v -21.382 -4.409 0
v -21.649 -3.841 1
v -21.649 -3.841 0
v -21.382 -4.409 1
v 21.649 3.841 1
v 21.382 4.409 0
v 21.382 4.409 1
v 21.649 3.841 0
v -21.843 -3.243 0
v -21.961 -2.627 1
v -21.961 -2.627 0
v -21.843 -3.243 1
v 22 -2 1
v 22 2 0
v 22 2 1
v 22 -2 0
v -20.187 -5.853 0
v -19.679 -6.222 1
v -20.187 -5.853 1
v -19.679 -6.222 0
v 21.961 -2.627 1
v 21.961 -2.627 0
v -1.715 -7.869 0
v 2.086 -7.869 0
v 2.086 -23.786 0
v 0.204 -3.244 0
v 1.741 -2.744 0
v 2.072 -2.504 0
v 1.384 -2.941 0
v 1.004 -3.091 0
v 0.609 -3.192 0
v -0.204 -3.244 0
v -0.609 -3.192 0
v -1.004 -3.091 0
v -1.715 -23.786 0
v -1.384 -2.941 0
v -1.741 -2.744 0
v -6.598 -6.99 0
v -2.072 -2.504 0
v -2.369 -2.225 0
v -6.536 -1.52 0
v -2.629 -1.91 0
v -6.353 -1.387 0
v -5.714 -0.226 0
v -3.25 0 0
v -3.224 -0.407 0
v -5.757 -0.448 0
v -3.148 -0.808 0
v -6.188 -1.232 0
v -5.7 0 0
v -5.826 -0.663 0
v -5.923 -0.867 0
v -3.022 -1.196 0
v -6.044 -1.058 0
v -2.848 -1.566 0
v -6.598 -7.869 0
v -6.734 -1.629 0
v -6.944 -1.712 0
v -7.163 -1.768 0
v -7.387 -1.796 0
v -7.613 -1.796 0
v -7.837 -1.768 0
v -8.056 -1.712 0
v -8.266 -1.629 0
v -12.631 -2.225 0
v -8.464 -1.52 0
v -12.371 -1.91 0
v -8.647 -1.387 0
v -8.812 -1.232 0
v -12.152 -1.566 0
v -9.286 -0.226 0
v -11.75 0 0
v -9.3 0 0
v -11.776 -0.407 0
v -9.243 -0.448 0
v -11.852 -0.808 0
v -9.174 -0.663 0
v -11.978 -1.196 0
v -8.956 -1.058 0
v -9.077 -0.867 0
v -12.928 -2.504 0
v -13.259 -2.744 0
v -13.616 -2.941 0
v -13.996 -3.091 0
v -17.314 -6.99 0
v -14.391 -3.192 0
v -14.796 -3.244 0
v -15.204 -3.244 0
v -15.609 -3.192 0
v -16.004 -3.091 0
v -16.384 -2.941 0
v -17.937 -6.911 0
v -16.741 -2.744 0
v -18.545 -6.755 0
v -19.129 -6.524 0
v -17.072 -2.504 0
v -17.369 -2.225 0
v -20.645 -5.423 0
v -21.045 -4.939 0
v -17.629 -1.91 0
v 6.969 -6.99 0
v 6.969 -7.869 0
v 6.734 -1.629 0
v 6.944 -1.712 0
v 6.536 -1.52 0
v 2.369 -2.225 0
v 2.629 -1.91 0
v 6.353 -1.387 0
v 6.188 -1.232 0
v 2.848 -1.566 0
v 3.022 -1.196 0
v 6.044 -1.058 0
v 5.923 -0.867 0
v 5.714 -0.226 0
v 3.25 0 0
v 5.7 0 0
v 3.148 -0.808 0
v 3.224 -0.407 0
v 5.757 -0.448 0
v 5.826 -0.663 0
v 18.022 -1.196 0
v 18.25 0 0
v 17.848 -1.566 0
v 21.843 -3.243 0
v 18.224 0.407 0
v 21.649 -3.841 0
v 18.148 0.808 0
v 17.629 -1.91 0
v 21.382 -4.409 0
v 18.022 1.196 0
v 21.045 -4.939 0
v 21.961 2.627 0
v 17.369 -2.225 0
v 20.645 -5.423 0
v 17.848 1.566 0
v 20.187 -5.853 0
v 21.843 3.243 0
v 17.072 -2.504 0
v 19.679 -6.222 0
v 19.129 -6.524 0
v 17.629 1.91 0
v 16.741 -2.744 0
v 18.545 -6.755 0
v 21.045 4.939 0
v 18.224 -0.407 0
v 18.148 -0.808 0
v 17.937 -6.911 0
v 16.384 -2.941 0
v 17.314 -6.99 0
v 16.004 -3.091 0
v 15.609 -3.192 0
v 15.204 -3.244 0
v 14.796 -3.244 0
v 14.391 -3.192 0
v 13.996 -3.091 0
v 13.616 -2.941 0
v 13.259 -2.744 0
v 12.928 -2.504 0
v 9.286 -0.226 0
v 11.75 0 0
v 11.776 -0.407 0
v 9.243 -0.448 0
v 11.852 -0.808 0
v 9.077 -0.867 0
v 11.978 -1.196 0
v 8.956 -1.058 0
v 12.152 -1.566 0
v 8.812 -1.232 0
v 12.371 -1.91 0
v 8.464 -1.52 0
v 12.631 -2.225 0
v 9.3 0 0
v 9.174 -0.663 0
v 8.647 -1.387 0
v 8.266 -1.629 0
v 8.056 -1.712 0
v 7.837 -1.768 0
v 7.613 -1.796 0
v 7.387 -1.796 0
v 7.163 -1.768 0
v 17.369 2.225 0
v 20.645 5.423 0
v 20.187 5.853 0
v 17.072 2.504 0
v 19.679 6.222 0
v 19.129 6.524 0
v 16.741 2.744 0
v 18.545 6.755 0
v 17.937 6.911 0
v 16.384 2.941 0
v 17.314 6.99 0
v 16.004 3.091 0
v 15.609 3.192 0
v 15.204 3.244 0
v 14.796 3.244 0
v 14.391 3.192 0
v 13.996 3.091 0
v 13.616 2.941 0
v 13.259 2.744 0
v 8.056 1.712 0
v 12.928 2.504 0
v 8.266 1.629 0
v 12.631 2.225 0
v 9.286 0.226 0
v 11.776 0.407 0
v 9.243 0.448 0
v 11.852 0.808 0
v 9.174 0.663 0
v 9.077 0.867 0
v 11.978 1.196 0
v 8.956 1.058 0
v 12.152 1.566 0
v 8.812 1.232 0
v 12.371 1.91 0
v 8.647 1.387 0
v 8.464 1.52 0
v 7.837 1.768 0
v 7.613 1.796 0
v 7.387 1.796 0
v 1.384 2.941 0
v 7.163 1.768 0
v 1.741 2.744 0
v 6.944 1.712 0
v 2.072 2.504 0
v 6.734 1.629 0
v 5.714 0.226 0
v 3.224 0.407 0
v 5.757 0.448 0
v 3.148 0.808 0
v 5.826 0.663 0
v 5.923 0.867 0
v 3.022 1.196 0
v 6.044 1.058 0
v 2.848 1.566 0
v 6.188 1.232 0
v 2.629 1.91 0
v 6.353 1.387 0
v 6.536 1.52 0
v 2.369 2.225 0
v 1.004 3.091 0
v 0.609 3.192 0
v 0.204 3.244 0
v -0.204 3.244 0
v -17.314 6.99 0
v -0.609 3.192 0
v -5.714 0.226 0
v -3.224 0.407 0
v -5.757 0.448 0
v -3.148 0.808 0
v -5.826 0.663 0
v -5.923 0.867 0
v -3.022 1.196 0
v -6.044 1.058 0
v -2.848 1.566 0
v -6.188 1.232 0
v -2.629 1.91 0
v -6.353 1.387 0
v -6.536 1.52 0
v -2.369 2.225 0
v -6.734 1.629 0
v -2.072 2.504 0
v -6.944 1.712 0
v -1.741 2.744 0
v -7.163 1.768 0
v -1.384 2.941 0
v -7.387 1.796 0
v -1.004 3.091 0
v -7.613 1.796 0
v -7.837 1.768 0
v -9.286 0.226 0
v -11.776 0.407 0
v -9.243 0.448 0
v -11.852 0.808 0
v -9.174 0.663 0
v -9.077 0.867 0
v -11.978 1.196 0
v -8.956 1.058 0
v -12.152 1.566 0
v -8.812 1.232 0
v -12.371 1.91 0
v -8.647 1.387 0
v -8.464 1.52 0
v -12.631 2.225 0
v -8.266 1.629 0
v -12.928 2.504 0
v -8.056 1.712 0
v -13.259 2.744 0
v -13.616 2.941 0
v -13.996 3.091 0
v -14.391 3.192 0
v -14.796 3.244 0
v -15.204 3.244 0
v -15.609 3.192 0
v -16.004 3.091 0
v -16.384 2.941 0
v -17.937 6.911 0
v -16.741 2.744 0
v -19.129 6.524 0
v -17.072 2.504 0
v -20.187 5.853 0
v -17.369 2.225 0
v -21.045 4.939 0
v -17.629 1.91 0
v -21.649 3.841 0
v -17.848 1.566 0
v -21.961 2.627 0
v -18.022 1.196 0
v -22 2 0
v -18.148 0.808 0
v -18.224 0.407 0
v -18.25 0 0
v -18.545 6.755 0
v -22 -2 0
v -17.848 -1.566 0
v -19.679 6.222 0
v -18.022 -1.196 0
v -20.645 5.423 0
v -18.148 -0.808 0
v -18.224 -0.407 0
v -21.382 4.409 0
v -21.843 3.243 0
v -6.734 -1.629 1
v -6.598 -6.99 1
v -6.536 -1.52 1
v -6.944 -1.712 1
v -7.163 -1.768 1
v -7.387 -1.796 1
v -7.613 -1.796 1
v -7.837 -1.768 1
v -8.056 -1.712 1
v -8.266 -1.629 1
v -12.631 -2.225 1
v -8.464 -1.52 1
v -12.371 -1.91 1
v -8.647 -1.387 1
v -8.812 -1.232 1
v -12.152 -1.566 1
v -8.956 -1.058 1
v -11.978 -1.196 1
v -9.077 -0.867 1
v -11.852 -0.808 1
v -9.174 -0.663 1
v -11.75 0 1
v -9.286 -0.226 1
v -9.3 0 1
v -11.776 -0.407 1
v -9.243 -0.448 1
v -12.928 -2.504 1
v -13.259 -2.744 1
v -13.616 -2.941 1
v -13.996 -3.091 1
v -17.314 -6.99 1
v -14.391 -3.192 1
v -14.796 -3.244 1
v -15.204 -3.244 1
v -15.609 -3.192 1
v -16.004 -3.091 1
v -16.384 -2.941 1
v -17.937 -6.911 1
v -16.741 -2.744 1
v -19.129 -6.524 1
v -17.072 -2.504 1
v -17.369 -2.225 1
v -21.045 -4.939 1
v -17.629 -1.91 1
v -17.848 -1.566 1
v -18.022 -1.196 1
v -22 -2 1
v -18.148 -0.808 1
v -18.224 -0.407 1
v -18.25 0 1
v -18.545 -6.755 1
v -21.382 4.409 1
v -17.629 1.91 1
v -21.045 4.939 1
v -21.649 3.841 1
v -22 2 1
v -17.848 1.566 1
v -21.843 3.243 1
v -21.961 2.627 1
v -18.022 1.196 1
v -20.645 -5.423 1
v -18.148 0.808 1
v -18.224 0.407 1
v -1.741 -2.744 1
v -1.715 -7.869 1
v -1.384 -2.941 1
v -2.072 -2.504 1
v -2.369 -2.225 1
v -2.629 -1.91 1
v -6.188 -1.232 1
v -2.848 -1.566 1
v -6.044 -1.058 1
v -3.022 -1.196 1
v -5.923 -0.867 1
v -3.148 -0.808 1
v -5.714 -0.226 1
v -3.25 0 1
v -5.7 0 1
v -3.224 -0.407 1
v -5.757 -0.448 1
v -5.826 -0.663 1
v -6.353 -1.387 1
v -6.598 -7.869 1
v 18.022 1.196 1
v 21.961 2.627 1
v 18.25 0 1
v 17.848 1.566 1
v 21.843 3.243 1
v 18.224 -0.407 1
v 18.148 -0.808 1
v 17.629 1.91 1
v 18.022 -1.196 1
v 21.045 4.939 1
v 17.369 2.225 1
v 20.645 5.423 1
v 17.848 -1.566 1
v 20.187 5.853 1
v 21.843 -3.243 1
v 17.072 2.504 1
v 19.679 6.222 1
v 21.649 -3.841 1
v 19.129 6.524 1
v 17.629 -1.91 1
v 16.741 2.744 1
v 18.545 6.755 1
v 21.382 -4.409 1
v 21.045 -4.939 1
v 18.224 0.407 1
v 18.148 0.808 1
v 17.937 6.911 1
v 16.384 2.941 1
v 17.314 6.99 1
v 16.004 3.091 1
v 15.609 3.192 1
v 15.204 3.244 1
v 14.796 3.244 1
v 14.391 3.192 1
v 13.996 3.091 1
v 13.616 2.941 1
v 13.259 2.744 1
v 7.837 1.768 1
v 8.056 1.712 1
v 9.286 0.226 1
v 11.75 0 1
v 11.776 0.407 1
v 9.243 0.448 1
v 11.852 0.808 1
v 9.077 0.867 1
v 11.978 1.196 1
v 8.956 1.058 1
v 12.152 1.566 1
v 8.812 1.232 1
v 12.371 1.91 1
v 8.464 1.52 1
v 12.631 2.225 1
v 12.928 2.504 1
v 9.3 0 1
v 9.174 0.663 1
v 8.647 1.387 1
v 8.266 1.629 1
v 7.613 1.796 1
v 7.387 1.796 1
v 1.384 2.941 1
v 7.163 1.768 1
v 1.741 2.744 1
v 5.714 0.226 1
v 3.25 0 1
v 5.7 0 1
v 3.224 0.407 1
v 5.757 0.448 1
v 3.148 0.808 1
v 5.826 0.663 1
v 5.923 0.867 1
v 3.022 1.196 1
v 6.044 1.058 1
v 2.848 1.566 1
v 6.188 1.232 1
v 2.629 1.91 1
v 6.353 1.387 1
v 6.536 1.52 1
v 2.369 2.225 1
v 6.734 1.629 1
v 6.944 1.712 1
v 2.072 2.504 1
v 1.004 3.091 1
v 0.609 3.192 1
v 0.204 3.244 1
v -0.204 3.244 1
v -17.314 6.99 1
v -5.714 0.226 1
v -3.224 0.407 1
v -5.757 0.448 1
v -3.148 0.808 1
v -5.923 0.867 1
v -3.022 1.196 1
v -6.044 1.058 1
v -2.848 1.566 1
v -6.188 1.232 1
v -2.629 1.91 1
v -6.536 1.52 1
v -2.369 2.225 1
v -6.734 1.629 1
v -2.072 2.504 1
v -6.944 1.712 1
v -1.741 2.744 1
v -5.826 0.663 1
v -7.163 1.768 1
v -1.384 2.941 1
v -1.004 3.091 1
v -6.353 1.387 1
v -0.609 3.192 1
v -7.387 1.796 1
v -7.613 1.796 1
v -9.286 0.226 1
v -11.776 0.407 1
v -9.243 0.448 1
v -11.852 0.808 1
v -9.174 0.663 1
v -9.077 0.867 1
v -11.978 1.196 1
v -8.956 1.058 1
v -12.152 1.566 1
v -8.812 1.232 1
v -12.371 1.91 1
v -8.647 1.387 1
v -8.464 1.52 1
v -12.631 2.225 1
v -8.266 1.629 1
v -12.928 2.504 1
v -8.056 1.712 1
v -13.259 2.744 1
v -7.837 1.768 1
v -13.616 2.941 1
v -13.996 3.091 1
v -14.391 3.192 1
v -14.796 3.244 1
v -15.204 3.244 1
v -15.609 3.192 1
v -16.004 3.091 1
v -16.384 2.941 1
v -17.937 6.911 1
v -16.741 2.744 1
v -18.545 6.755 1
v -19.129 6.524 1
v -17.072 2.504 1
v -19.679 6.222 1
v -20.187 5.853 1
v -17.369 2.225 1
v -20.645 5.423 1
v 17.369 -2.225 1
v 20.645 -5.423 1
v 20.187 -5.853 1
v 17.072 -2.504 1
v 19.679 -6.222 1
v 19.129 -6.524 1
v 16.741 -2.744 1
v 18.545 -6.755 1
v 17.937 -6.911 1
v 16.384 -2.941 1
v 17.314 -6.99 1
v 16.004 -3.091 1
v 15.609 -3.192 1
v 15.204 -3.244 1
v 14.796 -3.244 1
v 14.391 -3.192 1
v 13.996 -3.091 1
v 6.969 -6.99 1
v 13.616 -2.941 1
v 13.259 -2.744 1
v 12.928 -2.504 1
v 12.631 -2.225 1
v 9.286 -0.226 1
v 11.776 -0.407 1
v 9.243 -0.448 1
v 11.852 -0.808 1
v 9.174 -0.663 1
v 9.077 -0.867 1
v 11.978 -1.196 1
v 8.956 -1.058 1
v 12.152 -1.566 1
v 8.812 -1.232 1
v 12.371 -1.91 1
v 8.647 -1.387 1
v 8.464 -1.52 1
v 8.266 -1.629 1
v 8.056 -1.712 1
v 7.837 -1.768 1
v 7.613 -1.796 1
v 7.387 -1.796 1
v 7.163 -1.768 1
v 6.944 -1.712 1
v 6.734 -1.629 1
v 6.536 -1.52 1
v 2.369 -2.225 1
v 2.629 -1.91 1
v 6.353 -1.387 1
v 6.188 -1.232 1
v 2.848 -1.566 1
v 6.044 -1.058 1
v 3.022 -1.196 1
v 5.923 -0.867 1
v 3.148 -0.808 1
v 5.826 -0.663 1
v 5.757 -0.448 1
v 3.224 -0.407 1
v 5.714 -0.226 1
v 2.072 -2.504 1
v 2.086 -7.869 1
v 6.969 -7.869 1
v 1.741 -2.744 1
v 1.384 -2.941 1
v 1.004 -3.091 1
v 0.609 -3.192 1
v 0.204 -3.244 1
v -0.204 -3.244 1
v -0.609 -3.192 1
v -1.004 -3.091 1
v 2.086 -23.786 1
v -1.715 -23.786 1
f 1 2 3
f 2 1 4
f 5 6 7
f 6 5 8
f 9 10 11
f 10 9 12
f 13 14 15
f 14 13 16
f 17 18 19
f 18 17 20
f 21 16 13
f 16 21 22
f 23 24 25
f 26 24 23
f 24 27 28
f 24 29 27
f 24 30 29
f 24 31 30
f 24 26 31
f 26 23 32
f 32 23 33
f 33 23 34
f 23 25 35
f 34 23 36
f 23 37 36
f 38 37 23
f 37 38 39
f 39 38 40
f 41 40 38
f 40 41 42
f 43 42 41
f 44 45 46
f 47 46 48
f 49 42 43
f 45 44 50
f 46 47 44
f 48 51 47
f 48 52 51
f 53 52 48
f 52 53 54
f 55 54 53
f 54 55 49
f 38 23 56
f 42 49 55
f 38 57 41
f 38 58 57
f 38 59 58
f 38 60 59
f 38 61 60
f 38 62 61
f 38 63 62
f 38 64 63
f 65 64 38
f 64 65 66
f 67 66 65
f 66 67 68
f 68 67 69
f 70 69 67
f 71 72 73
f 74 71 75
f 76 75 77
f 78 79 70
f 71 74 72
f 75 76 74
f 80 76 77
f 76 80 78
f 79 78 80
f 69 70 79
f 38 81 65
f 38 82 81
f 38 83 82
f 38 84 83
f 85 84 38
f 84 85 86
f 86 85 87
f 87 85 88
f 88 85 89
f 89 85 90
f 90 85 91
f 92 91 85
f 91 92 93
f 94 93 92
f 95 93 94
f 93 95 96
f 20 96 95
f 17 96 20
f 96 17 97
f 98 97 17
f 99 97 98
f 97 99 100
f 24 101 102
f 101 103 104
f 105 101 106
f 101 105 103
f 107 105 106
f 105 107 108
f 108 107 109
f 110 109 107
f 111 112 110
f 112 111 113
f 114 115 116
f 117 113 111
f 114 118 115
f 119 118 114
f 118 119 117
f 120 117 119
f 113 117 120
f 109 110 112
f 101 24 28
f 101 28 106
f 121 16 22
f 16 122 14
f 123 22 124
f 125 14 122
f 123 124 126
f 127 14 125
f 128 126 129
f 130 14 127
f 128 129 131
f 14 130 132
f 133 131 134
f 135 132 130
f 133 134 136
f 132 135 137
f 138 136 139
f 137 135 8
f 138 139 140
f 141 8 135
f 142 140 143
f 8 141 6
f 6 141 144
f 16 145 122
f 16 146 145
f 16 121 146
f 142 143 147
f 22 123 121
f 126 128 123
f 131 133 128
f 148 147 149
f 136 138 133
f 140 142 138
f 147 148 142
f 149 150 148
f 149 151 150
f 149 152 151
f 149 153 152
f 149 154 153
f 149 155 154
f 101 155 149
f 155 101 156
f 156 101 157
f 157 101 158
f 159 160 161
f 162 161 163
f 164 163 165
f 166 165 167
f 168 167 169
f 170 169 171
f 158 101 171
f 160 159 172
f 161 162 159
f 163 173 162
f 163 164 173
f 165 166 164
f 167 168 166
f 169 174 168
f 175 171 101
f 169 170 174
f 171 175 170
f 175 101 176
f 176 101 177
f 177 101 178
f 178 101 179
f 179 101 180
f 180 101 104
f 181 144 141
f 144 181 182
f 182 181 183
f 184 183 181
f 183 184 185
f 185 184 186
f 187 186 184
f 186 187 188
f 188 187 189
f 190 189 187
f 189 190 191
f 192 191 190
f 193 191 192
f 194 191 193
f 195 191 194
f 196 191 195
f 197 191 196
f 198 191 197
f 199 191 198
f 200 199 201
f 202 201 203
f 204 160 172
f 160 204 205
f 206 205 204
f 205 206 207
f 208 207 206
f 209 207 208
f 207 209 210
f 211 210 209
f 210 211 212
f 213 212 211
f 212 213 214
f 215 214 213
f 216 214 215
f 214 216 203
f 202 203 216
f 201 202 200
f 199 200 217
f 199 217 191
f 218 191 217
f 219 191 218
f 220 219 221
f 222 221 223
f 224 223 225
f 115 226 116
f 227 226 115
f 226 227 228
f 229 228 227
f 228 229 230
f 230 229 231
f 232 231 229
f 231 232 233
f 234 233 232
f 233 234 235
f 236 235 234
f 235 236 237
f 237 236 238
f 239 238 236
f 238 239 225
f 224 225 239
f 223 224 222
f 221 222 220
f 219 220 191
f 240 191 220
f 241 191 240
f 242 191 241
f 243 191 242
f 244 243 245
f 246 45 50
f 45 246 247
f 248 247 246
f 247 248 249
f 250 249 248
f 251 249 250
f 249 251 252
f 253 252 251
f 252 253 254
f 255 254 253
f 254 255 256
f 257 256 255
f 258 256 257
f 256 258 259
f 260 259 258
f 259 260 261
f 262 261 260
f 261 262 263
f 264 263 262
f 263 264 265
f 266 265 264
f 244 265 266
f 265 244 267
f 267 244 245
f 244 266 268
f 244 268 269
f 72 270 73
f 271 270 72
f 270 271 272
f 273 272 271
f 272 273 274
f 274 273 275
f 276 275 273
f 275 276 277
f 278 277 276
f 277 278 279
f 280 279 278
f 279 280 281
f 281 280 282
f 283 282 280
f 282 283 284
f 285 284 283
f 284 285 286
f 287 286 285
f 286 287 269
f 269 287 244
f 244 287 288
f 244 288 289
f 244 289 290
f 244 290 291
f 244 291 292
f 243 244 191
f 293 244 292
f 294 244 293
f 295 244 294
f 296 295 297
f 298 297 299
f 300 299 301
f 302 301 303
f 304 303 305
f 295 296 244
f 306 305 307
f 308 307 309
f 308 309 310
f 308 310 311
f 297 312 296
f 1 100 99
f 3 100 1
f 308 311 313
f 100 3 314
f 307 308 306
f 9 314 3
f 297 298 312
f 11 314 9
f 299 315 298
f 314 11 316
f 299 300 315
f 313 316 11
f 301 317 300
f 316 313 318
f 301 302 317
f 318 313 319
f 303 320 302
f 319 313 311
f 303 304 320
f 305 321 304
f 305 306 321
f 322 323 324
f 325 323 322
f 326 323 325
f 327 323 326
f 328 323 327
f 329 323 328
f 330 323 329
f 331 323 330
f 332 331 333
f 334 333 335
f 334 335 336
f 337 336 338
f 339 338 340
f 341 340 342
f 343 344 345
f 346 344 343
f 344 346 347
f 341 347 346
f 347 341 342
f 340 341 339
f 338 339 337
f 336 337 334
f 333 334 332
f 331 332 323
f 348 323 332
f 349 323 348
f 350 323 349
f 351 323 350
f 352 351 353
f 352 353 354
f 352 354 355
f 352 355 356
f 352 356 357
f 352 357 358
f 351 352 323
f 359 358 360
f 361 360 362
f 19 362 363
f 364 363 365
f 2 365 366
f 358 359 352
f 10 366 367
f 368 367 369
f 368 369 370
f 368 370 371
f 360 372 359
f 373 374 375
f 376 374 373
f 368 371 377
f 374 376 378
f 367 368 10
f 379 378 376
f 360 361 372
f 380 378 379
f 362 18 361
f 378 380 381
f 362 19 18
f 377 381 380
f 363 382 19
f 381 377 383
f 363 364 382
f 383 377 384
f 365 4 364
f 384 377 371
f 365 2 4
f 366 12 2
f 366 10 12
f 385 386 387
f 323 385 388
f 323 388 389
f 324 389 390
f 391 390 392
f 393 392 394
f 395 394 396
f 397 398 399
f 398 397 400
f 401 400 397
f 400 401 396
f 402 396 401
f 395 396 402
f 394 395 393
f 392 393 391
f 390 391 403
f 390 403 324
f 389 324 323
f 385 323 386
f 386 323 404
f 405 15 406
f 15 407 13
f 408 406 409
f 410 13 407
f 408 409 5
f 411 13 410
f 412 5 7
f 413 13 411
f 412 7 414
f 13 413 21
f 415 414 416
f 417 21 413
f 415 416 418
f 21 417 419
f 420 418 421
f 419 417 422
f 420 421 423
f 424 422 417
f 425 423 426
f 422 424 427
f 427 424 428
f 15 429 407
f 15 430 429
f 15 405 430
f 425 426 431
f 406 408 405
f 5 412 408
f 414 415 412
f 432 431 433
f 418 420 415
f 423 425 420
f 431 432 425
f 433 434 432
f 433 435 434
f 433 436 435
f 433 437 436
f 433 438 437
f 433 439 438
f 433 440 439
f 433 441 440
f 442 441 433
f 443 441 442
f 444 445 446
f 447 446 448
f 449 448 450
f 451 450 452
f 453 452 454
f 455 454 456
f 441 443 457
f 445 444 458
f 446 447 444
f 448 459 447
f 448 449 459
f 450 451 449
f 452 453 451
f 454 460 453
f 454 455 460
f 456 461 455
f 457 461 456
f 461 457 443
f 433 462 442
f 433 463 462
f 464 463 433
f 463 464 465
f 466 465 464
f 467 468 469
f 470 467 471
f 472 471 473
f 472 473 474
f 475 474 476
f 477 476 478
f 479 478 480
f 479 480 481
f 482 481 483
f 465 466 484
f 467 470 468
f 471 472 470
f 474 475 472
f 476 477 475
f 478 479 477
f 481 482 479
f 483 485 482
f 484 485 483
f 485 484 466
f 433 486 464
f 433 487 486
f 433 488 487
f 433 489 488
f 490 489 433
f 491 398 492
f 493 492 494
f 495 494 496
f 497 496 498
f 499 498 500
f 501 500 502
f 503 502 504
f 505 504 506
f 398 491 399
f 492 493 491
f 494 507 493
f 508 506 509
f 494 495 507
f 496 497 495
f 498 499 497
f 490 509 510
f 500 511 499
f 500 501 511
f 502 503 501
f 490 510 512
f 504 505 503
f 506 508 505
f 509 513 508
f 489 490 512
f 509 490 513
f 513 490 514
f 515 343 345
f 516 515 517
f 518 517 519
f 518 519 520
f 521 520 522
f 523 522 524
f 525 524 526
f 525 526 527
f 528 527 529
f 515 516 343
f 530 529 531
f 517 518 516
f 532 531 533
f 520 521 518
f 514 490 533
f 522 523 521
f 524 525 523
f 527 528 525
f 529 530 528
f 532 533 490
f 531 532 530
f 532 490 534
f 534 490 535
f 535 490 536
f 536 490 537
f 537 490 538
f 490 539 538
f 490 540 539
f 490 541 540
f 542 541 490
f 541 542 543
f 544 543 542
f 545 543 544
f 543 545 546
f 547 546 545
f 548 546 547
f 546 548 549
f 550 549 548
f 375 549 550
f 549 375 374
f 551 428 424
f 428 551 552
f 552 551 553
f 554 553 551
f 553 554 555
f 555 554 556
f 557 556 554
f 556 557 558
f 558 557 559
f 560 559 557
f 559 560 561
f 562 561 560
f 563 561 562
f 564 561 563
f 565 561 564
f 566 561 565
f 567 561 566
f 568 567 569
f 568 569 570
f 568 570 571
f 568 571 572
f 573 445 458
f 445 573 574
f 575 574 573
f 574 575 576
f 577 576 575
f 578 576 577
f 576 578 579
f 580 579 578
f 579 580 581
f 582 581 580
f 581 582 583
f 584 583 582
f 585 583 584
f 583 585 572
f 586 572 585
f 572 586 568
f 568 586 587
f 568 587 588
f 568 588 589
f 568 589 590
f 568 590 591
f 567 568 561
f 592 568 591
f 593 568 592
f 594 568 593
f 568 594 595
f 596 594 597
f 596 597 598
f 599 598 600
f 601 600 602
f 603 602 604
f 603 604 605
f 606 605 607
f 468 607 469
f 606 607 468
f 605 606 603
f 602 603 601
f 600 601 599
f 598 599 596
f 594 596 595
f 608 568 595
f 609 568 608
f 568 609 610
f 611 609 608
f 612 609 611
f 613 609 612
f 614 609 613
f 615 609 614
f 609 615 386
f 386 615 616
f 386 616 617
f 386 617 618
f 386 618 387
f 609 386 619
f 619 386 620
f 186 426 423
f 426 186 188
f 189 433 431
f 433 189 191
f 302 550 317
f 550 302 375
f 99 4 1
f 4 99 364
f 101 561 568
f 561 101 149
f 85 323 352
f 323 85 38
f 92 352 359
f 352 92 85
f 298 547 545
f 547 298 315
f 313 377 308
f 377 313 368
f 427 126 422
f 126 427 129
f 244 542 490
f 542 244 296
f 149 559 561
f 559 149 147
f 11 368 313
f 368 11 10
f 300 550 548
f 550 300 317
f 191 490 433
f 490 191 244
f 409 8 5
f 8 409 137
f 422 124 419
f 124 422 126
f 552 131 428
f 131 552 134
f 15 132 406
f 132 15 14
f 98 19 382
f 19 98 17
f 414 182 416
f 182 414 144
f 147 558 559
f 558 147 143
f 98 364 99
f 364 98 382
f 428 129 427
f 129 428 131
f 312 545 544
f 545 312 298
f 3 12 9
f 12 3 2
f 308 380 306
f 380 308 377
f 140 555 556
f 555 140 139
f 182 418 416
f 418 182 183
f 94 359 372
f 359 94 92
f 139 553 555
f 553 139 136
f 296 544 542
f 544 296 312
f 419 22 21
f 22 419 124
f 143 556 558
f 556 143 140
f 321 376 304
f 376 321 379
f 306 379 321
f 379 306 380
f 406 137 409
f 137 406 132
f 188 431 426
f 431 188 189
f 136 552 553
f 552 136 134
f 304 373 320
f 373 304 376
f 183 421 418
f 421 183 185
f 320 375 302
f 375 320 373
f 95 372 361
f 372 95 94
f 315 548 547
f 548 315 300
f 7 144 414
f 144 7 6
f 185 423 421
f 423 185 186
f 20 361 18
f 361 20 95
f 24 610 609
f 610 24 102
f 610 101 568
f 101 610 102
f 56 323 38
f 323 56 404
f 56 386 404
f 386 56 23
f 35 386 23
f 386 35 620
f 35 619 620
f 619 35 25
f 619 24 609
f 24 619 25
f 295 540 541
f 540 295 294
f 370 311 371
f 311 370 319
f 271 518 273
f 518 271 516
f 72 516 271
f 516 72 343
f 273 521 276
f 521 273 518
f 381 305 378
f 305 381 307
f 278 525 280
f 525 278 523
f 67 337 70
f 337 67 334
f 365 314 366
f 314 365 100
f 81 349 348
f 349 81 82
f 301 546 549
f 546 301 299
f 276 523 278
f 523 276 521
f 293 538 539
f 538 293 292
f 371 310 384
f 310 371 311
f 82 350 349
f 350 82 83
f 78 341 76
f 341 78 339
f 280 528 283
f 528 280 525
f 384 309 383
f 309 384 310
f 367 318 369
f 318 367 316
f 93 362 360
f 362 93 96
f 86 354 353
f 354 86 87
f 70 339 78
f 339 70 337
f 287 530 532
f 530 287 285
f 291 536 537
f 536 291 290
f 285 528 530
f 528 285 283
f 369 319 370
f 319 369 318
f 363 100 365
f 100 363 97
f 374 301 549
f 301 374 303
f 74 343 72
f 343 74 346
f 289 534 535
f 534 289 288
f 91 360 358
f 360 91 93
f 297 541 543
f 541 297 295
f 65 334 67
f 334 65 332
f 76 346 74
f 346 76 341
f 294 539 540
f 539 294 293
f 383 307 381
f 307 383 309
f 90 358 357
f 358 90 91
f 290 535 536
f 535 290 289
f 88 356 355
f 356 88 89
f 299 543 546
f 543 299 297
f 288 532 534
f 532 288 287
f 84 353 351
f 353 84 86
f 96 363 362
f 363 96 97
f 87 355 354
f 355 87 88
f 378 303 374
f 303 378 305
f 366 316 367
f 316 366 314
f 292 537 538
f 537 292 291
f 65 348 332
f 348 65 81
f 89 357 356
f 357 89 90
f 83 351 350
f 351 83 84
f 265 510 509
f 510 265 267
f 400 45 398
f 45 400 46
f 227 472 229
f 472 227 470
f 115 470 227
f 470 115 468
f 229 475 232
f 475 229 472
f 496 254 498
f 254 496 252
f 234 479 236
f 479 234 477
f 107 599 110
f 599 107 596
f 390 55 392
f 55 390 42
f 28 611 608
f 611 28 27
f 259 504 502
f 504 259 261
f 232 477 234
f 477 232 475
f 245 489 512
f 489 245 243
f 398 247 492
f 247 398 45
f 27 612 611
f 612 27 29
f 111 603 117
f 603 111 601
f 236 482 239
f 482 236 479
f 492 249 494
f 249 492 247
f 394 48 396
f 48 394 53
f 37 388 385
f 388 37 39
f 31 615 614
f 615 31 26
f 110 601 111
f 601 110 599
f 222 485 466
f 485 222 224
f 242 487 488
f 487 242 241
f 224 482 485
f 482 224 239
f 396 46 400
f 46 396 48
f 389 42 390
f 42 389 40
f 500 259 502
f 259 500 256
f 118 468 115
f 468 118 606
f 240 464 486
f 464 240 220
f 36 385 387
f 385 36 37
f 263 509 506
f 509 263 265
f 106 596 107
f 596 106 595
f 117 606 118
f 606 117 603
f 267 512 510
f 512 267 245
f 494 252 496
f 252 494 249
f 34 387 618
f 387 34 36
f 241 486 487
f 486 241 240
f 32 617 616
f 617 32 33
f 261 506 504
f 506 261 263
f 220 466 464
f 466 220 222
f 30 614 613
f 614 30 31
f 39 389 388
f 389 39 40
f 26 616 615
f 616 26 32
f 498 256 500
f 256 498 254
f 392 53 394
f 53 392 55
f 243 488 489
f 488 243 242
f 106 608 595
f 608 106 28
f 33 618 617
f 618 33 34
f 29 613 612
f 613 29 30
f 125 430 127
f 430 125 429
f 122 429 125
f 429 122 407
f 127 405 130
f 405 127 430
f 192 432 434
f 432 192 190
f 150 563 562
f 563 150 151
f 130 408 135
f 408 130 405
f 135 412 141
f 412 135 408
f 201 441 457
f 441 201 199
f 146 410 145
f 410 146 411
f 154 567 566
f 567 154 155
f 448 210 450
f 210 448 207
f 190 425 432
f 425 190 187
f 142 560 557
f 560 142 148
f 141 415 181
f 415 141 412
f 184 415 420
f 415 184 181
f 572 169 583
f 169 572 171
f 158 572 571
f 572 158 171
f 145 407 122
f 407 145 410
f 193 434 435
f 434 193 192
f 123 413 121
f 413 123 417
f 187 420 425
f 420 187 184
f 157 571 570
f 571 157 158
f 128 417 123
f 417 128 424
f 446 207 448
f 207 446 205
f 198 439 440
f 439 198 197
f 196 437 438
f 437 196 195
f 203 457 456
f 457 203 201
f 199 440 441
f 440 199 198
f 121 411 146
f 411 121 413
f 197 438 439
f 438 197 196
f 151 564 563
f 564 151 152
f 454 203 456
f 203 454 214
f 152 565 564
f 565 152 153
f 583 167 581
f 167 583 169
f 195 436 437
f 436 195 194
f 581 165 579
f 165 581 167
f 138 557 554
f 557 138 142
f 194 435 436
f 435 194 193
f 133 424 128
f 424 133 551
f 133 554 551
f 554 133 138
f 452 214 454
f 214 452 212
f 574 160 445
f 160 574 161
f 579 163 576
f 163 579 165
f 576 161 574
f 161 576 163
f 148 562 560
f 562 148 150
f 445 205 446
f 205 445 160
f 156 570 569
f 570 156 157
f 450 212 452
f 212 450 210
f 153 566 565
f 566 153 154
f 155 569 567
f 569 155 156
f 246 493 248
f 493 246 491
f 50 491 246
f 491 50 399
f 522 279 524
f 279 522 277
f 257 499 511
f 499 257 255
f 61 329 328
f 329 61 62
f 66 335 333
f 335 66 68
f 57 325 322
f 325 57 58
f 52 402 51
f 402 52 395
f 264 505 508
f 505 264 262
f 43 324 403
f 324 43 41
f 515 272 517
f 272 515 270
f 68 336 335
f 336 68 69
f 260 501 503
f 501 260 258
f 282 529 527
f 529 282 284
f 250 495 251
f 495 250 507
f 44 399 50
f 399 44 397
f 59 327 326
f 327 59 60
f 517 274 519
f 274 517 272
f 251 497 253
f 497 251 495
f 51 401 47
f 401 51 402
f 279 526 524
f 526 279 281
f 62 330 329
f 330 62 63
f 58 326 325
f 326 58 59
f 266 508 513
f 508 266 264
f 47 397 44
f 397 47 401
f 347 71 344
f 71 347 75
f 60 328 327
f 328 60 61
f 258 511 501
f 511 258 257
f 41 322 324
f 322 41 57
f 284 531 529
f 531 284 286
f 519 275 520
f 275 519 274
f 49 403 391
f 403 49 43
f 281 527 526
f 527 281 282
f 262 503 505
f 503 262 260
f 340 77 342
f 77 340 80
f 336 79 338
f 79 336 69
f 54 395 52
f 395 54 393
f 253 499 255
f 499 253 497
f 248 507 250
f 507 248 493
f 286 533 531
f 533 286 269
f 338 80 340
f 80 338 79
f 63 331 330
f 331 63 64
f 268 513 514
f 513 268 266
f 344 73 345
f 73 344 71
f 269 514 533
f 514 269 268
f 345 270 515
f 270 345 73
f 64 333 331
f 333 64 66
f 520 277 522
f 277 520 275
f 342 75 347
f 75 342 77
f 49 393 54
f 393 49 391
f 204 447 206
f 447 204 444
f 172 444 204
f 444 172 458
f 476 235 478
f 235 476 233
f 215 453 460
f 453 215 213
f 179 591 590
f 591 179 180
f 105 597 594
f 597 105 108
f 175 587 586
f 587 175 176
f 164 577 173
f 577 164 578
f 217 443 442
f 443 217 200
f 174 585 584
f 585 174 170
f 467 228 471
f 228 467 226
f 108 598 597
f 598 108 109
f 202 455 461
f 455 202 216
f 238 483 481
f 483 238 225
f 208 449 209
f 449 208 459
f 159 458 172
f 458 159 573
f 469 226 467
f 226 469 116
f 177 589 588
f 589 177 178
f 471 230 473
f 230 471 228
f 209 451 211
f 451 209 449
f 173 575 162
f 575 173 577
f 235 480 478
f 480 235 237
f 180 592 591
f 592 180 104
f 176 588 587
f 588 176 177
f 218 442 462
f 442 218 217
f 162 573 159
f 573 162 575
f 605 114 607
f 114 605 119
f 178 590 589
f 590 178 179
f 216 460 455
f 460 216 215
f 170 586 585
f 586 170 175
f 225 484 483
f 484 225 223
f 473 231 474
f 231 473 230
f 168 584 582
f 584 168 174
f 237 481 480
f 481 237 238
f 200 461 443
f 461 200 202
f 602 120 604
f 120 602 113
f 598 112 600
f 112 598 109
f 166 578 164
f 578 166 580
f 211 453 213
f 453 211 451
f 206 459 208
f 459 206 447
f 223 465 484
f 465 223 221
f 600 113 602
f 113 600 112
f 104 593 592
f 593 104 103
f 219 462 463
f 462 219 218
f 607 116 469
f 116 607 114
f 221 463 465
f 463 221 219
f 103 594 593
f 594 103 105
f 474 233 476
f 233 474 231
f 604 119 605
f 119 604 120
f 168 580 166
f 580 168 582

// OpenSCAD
$fn = 50;


difference() {
	union() {
		hull() {
			translate(v = [-17.0000000000, 2.0000000000, 0]) {
				cylinder(h = 1, r = 5);
			}
			translate(v = [17.0000000000, 2.0000000000, 0]) {
				cylinder(h = 1, r = 5);
			}
			translate(v = [-17.0000000000, -2.0000000000, 0]) {
				cylinder(h = 1, r = 5);
			}
			translate(v = [17.0000000000, -2.0000000000, 0]) {
				cylinder(h = 1, r = 5);
			}
		}
		translate(v = [0, -5, 0]) {
			linear_extrude(height = 1) {
				text(font = "DejaVu Sans Mono:style=Bold", halign = "center", size = 19.0000000000, text = "T", valign = "top");
			}
		}
	}
	union() {
		translate(v = [-15.0000000000, 0.0000000000, 0]) {
			translate(v = [0, 0, -100]) {
				cylinder(h = 200, r = 3.2500000000);
			}
		}
		translate(v = [0, 0, -100]) {
			cylinder(h = 200, r = 3.2500000000);
		}
		translate(v = [15.0000000000, 0.0000000000, 0]) {
			translate(v = [0, 0, -100]) {
				cylinder(h = 200, r = 3.2500000000);
			}
		}
		translate(v = [-15.0000000000, 0.0000000000, 0]) {
			translate(v = [0, 0, -100]) {
				cylinder(h = 200, r = 1.8000000000);
			}
		}
		translate(v = [-7.5000000000, 0.0000000000, 0]) {
			translate(v = [0, 0, -100]) {
				cylinder(h = 200, r = 1.8000000000);
			}
		}
		translate(v = [0, 0, -100]) {
			cylinder(h = 200, r = 1.8000000000);
		}
		translate(v = [7.5000000000, 0.0000000000, 0]) {
			translate(v = [0, 0, -100]) {
				cylinder(h = 200, r = 1.8000000000);
			}
		}
		translate(v = [15.0000000000, 0.0000000000, 0]) {
			translate(v = [0, 0, -100]) {
				cylinder(h = 200, r = 1.8000000000);
			}
		}
	}
}
